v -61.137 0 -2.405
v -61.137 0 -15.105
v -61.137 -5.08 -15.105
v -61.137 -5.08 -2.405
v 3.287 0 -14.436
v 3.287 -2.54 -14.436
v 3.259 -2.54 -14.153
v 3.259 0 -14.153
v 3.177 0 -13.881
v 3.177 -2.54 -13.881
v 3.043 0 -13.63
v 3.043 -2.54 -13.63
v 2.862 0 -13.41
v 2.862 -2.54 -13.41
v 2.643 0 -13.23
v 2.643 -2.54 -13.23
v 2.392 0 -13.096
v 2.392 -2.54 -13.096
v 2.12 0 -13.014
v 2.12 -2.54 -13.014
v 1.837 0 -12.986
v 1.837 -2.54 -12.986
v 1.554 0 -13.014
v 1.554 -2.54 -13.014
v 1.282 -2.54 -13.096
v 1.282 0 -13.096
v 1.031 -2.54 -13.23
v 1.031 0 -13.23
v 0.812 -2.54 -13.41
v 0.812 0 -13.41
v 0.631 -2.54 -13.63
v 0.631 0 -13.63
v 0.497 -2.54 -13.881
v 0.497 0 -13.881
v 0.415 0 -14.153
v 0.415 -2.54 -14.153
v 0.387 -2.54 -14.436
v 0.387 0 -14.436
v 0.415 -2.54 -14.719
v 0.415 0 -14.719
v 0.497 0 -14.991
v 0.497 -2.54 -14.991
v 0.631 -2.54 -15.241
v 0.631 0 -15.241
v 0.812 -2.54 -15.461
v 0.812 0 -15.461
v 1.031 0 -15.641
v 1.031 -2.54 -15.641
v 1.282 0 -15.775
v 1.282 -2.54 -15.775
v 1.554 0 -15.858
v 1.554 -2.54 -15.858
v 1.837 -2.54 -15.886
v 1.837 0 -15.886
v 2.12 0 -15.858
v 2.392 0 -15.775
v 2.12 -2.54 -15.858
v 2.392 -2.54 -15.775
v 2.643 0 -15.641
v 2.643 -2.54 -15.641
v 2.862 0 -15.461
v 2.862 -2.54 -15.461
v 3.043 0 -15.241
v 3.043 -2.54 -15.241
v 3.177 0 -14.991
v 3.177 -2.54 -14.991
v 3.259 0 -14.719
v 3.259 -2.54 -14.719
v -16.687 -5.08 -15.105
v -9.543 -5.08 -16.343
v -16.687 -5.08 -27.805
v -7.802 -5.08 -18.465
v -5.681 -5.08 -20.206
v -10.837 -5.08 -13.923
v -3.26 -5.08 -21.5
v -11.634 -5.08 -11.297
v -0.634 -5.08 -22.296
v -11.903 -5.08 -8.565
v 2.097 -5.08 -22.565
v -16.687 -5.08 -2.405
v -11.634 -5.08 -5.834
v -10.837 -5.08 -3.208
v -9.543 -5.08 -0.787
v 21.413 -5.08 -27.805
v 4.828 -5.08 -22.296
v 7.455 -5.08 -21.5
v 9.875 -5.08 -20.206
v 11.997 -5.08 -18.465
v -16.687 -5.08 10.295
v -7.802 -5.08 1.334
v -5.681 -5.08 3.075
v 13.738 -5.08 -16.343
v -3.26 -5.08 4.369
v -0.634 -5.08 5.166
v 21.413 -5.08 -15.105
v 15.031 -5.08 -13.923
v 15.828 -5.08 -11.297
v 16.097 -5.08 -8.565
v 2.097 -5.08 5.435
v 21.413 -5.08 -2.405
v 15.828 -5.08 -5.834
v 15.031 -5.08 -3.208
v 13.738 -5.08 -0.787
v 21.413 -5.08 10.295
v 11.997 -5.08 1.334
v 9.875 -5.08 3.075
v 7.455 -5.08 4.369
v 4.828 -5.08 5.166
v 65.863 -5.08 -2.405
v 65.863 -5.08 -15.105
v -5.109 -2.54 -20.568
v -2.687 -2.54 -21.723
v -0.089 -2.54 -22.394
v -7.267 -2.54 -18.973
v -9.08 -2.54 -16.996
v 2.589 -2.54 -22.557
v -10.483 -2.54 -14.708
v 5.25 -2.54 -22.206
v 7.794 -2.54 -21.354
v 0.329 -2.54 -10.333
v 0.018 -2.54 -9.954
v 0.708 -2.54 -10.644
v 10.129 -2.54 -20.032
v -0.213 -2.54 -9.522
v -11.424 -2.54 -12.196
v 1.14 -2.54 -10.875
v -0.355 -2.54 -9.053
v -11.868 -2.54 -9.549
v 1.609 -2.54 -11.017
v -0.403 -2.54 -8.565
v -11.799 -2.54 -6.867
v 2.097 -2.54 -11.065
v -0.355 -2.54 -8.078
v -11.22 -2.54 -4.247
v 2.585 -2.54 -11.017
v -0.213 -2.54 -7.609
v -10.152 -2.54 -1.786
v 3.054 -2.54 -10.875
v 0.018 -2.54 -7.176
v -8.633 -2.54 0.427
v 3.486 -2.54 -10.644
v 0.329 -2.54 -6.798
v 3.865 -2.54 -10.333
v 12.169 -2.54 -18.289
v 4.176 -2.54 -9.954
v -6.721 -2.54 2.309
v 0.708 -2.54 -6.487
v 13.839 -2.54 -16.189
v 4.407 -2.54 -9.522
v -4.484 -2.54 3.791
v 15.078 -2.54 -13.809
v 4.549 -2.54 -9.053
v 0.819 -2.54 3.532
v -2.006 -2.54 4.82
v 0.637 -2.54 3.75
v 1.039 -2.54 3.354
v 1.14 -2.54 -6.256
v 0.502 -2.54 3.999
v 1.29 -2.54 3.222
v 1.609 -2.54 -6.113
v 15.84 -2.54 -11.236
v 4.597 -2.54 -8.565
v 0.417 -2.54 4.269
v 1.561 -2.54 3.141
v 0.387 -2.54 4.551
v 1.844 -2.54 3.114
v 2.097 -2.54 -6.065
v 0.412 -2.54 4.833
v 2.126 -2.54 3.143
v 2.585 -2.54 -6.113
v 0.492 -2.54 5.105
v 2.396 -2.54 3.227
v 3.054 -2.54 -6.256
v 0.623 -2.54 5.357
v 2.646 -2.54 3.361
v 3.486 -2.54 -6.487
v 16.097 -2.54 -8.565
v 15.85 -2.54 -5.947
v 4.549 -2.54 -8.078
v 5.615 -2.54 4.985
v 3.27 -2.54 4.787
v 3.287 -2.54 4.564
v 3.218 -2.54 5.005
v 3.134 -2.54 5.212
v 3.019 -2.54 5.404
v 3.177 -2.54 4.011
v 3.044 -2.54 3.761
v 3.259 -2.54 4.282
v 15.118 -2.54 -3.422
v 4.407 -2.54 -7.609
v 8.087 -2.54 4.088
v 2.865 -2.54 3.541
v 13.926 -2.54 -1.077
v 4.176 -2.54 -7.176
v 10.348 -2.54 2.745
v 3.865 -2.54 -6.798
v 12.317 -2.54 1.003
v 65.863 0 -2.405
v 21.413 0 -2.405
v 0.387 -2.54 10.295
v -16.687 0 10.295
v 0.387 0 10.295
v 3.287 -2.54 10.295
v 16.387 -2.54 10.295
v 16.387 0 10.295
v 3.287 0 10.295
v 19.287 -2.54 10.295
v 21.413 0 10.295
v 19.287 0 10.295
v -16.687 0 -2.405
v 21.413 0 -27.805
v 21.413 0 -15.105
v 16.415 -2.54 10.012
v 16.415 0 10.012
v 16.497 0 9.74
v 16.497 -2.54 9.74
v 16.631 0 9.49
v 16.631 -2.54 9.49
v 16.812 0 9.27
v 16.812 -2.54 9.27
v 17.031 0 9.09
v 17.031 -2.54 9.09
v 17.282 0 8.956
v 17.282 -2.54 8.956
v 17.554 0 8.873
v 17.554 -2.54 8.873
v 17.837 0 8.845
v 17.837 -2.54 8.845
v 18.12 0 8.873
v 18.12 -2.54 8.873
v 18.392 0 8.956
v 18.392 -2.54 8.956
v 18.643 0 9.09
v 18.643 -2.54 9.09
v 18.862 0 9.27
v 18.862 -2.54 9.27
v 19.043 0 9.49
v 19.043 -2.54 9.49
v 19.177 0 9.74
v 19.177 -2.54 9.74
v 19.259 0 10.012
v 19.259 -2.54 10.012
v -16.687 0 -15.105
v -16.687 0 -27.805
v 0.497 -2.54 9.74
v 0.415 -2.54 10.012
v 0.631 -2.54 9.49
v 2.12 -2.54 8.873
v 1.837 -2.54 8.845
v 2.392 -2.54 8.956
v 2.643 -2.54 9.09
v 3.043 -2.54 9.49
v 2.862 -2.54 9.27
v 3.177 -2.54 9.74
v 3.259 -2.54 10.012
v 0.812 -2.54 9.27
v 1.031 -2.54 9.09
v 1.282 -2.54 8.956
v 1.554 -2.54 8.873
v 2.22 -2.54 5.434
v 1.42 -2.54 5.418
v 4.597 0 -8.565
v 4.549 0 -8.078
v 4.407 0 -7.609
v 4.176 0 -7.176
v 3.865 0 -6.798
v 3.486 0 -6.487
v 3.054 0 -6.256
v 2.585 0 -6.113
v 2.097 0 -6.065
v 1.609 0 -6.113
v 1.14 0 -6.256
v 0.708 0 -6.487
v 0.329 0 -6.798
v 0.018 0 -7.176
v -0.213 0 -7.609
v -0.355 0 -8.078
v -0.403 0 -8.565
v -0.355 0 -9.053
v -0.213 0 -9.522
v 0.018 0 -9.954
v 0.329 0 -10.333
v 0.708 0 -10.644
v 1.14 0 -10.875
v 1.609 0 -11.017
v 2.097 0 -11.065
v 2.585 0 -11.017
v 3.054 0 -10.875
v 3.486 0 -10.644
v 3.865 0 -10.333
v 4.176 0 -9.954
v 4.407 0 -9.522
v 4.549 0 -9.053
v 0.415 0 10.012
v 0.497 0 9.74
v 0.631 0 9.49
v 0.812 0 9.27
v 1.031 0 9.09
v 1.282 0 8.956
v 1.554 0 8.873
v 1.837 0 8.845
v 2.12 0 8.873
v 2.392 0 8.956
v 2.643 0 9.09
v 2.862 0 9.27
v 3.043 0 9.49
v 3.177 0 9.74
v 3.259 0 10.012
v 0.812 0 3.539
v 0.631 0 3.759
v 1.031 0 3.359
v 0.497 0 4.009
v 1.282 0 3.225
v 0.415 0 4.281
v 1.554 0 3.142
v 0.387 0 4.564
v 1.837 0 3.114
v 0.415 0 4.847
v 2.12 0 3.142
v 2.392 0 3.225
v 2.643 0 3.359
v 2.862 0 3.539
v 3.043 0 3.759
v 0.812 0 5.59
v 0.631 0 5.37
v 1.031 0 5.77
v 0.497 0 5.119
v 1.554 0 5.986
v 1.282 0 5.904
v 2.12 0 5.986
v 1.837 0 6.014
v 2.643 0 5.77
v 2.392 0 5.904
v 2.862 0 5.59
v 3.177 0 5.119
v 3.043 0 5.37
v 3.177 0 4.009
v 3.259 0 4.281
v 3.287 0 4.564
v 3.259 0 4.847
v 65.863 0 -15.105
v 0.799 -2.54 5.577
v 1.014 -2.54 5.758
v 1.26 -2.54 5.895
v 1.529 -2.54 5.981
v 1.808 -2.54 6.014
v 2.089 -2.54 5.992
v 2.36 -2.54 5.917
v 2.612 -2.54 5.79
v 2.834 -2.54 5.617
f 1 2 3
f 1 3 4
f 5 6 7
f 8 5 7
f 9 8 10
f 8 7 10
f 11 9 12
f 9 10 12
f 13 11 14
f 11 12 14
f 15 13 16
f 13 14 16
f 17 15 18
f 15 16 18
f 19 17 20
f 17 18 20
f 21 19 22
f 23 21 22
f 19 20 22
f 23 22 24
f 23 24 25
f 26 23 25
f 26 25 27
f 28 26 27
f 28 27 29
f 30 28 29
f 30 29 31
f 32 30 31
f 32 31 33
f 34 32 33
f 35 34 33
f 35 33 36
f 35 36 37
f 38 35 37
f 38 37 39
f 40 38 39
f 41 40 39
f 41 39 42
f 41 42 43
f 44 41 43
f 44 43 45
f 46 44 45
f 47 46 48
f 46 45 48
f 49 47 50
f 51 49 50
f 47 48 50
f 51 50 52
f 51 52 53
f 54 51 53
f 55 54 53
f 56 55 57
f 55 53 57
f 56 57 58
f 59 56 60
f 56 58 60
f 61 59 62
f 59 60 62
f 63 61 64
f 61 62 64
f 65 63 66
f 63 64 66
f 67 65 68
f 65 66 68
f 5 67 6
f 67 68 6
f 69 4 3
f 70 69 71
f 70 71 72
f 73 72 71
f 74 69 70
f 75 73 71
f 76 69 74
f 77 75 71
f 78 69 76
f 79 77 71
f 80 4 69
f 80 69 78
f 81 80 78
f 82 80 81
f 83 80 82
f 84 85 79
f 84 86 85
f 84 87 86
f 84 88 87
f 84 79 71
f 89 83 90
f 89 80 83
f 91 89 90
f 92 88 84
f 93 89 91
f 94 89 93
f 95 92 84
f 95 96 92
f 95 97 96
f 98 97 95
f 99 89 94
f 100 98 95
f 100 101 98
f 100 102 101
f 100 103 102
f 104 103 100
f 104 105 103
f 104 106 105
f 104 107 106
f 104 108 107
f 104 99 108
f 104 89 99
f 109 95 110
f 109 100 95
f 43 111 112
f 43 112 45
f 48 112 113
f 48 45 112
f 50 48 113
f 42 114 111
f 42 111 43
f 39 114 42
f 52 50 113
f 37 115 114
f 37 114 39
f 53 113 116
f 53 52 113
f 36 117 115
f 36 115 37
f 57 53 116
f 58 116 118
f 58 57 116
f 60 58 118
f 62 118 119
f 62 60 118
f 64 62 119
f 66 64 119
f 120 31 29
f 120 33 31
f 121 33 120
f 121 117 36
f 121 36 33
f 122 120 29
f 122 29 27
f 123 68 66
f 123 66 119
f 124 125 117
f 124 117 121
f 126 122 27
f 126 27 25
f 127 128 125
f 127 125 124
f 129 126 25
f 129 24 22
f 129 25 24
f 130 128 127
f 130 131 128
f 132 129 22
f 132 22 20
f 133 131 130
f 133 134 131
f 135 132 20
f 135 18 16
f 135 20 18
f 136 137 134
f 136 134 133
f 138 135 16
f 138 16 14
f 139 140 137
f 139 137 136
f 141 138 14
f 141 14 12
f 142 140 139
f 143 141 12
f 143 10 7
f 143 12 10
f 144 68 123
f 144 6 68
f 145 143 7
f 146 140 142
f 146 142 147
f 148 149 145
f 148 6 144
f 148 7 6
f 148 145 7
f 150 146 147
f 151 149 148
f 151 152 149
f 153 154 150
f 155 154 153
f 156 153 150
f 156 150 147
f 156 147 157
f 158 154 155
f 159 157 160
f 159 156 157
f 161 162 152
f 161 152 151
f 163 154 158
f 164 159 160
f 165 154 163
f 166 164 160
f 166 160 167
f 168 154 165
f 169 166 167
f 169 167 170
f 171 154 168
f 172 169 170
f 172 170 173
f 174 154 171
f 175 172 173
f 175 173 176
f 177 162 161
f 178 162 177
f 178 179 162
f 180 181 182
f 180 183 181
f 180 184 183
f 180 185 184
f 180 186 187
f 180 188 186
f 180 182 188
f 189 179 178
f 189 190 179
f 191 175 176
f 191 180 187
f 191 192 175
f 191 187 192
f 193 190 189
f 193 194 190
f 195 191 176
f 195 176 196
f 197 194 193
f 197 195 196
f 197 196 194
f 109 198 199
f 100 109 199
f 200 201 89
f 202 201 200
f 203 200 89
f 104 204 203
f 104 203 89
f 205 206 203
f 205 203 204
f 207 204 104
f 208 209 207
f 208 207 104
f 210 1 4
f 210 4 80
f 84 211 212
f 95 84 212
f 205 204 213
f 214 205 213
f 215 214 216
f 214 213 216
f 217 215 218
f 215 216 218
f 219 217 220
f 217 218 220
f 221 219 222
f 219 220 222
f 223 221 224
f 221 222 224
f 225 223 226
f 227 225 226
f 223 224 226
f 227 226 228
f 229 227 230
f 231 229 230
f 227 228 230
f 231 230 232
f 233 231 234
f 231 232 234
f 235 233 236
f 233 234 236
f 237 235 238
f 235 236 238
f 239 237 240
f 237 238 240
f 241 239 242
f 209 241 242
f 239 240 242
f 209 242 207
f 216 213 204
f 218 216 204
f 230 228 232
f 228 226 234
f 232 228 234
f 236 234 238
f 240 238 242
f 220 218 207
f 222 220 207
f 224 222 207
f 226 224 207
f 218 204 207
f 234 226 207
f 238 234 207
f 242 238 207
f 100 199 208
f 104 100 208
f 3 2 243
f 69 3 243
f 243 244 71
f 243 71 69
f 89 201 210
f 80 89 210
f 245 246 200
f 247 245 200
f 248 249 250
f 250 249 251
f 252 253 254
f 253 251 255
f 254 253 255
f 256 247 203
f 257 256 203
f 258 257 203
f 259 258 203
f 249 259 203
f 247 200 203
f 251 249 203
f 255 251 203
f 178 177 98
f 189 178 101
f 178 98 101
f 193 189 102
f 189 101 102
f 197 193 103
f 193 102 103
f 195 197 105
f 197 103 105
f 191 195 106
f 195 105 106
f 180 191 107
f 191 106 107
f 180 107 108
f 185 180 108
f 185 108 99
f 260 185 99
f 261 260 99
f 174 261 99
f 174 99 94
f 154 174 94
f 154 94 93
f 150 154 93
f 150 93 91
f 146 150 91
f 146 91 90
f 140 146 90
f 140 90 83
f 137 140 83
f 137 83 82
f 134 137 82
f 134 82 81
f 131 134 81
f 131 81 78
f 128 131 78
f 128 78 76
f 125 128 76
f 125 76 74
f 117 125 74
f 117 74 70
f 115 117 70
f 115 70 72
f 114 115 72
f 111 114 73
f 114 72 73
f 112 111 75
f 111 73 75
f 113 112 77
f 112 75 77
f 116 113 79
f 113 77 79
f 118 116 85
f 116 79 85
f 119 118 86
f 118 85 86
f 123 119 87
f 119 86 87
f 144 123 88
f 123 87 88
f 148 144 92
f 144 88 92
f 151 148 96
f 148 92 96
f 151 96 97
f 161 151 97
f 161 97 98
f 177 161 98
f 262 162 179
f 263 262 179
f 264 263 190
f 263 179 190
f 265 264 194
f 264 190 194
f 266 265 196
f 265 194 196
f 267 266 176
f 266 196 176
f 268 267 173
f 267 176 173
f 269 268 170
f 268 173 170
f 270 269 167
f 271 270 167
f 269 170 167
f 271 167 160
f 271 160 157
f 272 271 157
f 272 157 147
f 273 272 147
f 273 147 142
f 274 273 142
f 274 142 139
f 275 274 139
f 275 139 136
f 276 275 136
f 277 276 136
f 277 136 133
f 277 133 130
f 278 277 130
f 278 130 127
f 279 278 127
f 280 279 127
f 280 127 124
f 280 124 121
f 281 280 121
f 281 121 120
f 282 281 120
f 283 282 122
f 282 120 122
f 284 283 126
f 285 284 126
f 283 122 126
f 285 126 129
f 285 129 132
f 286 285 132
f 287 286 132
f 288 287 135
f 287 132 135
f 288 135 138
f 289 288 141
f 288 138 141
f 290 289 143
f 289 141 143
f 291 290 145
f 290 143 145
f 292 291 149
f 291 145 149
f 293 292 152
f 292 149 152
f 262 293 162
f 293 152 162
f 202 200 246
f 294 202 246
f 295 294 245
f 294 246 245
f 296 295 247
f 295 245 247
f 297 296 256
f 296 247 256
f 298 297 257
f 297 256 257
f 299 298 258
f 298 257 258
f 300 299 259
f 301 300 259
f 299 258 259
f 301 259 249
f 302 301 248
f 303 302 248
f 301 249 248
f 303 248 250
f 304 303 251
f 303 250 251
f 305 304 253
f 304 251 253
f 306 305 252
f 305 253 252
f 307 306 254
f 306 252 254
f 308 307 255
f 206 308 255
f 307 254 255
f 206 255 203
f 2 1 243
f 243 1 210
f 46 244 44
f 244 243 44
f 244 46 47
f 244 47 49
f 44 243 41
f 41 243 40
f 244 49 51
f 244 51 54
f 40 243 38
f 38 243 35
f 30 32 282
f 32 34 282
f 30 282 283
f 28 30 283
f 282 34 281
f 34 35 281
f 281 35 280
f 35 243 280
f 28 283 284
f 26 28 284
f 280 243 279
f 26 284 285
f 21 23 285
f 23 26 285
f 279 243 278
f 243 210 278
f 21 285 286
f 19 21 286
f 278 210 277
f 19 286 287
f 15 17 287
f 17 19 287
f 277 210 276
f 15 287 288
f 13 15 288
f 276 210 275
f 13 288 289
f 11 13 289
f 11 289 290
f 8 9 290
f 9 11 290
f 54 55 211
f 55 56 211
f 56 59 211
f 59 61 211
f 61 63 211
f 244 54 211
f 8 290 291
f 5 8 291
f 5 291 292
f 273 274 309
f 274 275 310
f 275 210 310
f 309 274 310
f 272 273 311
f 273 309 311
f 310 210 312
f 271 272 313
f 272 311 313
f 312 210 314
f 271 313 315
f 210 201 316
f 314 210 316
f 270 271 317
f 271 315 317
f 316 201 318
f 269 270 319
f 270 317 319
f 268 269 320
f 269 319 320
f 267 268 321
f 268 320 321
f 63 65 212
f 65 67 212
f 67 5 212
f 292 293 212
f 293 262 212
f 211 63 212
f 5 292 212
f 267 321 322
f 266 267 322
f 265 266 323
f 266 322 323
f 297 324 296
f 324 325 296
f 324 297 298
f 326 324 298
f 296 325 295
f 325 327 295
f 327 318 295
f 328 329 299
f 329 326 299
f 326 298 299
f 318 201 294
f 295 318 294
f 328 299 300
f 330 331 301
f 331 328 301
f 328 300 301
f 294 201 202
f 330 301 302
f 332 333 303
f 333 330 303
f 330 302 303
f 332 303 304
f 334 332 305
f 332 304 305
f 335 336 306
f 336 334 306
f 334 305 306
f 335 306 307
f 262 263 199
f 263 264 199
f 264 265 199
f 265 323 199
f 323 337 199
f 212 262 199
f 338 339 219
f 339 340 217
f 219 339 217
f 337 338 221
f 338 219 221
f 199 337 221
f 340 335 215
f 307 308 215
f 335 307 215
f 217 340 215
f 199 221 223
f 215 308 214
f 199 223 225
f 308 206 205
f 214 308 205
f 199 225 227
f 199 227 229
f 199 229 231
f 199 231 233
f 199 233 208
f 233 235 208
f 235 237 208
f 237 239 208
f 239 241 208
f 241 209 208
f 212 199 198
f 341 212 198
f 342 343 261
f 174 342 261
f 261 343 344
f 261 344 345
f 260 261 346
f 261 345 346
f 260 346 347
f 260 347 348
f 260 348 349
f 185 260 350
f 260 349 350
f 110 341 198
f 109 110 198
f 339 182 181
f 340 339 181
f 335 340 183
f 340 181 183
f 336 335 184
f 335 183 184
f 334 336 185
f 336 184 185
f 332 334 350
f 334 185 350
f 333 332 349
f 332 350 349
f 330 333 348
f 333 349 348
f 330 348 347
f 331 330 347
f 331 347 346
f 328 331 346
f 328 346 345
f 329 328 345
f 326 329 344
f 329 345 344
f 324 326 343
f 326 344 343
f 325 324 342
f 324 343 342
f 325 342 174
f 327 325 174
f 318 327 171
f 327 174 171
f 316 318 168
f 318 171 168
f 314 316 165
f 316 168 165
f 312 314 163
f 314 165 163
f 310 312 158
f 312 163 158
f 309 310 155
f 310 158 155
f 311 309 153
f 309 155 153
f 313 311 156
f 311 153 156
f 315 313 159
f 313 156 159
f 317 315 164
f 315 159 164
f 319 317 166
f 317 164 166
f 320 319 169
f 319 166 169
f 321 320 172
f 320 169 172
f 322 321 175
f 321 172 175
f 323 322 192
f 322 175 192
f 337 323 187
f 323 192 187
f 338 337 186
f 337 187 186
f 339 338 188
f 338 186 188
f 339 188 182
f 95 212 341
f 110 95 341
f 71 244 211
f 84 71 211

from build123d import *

# Parameters (mm, degrees)
F0_W     = 20.729122051
F0_H     = 12.7
F0_W_2   = 12.7
F0_W_3   = 11.020877949
F0_W_4   = 38.1
F0_W_5   = 44.45
F1_DEPTH = 5.08
F2_R     = 14
F3_DEPTH = 2.54
F4_R     = 1.45
F4_R_2   = 2.5
F5_DEPTH = 25.4


with BuildPart() as f1:
    # F0 (on Front) → F1 (new body)
    with BuildSketch(Plane.XZ):
        with Locations((31.7778353898, -8.7548155423)):
            Rectangle(F0_W, F0_H)
        with Locations((48.4923964153, -8.7548155423)):
            Rectangle(F0_W_2, F0_H)
        with Locations((60.3528353898, -8.7548155423)):
            Rectangle(F0_W_3, F0_H)
        with Locations((2.3632743643, -8.7548155423)):
            Rectangle(F0_W_4, F0_H)
        with Locations((2.3632743643, 3.9451844577)):
            Rectangle(F0_W_4, F0_H)
        with Locations((-38.9117256357, -8.7548155423)):
            Rectangle(F0_W_5, F0_H)
        with Locations((2.3632743643, -21.4548155423)):
            Rectangle(F0_W_4, F0_H)
    extrude(amount=F1_DEPTH)

    # F2 (on face) → F3 (cut)
    with BuildSketch(Plane.XZ.offset(5.08)):
        with Locations((2.0971329576, -8.5653651081)):
            Circle(F2_R)
    extrude(amount=-F3_DEPTH, mode=Mode.SUBTRACT)

    # F4 (on face) → F5 (cut)
    with BuildSketch(Plane.XZ.offset(2.54)):
        with Locations((17.8370033559, 10.2951844577)):
            Circle(F4_R)
        with Locations((1.8370033559, 10.2951844577)):
            Circle(F4_R)
        with Locations((1.8370033559, -14.4356723465)):
            Circle(F4_R)
        with Locations((1.8370033559, 4.5643276535)):
            Circle(F4_R)
        with Locations((2.0971329576, -8.5653651081)):
            Circle(F4_R_2)
    extrude(amount=-F5_DEPTH, mode=Mode.SUBTRACT)


solid = f1.part
